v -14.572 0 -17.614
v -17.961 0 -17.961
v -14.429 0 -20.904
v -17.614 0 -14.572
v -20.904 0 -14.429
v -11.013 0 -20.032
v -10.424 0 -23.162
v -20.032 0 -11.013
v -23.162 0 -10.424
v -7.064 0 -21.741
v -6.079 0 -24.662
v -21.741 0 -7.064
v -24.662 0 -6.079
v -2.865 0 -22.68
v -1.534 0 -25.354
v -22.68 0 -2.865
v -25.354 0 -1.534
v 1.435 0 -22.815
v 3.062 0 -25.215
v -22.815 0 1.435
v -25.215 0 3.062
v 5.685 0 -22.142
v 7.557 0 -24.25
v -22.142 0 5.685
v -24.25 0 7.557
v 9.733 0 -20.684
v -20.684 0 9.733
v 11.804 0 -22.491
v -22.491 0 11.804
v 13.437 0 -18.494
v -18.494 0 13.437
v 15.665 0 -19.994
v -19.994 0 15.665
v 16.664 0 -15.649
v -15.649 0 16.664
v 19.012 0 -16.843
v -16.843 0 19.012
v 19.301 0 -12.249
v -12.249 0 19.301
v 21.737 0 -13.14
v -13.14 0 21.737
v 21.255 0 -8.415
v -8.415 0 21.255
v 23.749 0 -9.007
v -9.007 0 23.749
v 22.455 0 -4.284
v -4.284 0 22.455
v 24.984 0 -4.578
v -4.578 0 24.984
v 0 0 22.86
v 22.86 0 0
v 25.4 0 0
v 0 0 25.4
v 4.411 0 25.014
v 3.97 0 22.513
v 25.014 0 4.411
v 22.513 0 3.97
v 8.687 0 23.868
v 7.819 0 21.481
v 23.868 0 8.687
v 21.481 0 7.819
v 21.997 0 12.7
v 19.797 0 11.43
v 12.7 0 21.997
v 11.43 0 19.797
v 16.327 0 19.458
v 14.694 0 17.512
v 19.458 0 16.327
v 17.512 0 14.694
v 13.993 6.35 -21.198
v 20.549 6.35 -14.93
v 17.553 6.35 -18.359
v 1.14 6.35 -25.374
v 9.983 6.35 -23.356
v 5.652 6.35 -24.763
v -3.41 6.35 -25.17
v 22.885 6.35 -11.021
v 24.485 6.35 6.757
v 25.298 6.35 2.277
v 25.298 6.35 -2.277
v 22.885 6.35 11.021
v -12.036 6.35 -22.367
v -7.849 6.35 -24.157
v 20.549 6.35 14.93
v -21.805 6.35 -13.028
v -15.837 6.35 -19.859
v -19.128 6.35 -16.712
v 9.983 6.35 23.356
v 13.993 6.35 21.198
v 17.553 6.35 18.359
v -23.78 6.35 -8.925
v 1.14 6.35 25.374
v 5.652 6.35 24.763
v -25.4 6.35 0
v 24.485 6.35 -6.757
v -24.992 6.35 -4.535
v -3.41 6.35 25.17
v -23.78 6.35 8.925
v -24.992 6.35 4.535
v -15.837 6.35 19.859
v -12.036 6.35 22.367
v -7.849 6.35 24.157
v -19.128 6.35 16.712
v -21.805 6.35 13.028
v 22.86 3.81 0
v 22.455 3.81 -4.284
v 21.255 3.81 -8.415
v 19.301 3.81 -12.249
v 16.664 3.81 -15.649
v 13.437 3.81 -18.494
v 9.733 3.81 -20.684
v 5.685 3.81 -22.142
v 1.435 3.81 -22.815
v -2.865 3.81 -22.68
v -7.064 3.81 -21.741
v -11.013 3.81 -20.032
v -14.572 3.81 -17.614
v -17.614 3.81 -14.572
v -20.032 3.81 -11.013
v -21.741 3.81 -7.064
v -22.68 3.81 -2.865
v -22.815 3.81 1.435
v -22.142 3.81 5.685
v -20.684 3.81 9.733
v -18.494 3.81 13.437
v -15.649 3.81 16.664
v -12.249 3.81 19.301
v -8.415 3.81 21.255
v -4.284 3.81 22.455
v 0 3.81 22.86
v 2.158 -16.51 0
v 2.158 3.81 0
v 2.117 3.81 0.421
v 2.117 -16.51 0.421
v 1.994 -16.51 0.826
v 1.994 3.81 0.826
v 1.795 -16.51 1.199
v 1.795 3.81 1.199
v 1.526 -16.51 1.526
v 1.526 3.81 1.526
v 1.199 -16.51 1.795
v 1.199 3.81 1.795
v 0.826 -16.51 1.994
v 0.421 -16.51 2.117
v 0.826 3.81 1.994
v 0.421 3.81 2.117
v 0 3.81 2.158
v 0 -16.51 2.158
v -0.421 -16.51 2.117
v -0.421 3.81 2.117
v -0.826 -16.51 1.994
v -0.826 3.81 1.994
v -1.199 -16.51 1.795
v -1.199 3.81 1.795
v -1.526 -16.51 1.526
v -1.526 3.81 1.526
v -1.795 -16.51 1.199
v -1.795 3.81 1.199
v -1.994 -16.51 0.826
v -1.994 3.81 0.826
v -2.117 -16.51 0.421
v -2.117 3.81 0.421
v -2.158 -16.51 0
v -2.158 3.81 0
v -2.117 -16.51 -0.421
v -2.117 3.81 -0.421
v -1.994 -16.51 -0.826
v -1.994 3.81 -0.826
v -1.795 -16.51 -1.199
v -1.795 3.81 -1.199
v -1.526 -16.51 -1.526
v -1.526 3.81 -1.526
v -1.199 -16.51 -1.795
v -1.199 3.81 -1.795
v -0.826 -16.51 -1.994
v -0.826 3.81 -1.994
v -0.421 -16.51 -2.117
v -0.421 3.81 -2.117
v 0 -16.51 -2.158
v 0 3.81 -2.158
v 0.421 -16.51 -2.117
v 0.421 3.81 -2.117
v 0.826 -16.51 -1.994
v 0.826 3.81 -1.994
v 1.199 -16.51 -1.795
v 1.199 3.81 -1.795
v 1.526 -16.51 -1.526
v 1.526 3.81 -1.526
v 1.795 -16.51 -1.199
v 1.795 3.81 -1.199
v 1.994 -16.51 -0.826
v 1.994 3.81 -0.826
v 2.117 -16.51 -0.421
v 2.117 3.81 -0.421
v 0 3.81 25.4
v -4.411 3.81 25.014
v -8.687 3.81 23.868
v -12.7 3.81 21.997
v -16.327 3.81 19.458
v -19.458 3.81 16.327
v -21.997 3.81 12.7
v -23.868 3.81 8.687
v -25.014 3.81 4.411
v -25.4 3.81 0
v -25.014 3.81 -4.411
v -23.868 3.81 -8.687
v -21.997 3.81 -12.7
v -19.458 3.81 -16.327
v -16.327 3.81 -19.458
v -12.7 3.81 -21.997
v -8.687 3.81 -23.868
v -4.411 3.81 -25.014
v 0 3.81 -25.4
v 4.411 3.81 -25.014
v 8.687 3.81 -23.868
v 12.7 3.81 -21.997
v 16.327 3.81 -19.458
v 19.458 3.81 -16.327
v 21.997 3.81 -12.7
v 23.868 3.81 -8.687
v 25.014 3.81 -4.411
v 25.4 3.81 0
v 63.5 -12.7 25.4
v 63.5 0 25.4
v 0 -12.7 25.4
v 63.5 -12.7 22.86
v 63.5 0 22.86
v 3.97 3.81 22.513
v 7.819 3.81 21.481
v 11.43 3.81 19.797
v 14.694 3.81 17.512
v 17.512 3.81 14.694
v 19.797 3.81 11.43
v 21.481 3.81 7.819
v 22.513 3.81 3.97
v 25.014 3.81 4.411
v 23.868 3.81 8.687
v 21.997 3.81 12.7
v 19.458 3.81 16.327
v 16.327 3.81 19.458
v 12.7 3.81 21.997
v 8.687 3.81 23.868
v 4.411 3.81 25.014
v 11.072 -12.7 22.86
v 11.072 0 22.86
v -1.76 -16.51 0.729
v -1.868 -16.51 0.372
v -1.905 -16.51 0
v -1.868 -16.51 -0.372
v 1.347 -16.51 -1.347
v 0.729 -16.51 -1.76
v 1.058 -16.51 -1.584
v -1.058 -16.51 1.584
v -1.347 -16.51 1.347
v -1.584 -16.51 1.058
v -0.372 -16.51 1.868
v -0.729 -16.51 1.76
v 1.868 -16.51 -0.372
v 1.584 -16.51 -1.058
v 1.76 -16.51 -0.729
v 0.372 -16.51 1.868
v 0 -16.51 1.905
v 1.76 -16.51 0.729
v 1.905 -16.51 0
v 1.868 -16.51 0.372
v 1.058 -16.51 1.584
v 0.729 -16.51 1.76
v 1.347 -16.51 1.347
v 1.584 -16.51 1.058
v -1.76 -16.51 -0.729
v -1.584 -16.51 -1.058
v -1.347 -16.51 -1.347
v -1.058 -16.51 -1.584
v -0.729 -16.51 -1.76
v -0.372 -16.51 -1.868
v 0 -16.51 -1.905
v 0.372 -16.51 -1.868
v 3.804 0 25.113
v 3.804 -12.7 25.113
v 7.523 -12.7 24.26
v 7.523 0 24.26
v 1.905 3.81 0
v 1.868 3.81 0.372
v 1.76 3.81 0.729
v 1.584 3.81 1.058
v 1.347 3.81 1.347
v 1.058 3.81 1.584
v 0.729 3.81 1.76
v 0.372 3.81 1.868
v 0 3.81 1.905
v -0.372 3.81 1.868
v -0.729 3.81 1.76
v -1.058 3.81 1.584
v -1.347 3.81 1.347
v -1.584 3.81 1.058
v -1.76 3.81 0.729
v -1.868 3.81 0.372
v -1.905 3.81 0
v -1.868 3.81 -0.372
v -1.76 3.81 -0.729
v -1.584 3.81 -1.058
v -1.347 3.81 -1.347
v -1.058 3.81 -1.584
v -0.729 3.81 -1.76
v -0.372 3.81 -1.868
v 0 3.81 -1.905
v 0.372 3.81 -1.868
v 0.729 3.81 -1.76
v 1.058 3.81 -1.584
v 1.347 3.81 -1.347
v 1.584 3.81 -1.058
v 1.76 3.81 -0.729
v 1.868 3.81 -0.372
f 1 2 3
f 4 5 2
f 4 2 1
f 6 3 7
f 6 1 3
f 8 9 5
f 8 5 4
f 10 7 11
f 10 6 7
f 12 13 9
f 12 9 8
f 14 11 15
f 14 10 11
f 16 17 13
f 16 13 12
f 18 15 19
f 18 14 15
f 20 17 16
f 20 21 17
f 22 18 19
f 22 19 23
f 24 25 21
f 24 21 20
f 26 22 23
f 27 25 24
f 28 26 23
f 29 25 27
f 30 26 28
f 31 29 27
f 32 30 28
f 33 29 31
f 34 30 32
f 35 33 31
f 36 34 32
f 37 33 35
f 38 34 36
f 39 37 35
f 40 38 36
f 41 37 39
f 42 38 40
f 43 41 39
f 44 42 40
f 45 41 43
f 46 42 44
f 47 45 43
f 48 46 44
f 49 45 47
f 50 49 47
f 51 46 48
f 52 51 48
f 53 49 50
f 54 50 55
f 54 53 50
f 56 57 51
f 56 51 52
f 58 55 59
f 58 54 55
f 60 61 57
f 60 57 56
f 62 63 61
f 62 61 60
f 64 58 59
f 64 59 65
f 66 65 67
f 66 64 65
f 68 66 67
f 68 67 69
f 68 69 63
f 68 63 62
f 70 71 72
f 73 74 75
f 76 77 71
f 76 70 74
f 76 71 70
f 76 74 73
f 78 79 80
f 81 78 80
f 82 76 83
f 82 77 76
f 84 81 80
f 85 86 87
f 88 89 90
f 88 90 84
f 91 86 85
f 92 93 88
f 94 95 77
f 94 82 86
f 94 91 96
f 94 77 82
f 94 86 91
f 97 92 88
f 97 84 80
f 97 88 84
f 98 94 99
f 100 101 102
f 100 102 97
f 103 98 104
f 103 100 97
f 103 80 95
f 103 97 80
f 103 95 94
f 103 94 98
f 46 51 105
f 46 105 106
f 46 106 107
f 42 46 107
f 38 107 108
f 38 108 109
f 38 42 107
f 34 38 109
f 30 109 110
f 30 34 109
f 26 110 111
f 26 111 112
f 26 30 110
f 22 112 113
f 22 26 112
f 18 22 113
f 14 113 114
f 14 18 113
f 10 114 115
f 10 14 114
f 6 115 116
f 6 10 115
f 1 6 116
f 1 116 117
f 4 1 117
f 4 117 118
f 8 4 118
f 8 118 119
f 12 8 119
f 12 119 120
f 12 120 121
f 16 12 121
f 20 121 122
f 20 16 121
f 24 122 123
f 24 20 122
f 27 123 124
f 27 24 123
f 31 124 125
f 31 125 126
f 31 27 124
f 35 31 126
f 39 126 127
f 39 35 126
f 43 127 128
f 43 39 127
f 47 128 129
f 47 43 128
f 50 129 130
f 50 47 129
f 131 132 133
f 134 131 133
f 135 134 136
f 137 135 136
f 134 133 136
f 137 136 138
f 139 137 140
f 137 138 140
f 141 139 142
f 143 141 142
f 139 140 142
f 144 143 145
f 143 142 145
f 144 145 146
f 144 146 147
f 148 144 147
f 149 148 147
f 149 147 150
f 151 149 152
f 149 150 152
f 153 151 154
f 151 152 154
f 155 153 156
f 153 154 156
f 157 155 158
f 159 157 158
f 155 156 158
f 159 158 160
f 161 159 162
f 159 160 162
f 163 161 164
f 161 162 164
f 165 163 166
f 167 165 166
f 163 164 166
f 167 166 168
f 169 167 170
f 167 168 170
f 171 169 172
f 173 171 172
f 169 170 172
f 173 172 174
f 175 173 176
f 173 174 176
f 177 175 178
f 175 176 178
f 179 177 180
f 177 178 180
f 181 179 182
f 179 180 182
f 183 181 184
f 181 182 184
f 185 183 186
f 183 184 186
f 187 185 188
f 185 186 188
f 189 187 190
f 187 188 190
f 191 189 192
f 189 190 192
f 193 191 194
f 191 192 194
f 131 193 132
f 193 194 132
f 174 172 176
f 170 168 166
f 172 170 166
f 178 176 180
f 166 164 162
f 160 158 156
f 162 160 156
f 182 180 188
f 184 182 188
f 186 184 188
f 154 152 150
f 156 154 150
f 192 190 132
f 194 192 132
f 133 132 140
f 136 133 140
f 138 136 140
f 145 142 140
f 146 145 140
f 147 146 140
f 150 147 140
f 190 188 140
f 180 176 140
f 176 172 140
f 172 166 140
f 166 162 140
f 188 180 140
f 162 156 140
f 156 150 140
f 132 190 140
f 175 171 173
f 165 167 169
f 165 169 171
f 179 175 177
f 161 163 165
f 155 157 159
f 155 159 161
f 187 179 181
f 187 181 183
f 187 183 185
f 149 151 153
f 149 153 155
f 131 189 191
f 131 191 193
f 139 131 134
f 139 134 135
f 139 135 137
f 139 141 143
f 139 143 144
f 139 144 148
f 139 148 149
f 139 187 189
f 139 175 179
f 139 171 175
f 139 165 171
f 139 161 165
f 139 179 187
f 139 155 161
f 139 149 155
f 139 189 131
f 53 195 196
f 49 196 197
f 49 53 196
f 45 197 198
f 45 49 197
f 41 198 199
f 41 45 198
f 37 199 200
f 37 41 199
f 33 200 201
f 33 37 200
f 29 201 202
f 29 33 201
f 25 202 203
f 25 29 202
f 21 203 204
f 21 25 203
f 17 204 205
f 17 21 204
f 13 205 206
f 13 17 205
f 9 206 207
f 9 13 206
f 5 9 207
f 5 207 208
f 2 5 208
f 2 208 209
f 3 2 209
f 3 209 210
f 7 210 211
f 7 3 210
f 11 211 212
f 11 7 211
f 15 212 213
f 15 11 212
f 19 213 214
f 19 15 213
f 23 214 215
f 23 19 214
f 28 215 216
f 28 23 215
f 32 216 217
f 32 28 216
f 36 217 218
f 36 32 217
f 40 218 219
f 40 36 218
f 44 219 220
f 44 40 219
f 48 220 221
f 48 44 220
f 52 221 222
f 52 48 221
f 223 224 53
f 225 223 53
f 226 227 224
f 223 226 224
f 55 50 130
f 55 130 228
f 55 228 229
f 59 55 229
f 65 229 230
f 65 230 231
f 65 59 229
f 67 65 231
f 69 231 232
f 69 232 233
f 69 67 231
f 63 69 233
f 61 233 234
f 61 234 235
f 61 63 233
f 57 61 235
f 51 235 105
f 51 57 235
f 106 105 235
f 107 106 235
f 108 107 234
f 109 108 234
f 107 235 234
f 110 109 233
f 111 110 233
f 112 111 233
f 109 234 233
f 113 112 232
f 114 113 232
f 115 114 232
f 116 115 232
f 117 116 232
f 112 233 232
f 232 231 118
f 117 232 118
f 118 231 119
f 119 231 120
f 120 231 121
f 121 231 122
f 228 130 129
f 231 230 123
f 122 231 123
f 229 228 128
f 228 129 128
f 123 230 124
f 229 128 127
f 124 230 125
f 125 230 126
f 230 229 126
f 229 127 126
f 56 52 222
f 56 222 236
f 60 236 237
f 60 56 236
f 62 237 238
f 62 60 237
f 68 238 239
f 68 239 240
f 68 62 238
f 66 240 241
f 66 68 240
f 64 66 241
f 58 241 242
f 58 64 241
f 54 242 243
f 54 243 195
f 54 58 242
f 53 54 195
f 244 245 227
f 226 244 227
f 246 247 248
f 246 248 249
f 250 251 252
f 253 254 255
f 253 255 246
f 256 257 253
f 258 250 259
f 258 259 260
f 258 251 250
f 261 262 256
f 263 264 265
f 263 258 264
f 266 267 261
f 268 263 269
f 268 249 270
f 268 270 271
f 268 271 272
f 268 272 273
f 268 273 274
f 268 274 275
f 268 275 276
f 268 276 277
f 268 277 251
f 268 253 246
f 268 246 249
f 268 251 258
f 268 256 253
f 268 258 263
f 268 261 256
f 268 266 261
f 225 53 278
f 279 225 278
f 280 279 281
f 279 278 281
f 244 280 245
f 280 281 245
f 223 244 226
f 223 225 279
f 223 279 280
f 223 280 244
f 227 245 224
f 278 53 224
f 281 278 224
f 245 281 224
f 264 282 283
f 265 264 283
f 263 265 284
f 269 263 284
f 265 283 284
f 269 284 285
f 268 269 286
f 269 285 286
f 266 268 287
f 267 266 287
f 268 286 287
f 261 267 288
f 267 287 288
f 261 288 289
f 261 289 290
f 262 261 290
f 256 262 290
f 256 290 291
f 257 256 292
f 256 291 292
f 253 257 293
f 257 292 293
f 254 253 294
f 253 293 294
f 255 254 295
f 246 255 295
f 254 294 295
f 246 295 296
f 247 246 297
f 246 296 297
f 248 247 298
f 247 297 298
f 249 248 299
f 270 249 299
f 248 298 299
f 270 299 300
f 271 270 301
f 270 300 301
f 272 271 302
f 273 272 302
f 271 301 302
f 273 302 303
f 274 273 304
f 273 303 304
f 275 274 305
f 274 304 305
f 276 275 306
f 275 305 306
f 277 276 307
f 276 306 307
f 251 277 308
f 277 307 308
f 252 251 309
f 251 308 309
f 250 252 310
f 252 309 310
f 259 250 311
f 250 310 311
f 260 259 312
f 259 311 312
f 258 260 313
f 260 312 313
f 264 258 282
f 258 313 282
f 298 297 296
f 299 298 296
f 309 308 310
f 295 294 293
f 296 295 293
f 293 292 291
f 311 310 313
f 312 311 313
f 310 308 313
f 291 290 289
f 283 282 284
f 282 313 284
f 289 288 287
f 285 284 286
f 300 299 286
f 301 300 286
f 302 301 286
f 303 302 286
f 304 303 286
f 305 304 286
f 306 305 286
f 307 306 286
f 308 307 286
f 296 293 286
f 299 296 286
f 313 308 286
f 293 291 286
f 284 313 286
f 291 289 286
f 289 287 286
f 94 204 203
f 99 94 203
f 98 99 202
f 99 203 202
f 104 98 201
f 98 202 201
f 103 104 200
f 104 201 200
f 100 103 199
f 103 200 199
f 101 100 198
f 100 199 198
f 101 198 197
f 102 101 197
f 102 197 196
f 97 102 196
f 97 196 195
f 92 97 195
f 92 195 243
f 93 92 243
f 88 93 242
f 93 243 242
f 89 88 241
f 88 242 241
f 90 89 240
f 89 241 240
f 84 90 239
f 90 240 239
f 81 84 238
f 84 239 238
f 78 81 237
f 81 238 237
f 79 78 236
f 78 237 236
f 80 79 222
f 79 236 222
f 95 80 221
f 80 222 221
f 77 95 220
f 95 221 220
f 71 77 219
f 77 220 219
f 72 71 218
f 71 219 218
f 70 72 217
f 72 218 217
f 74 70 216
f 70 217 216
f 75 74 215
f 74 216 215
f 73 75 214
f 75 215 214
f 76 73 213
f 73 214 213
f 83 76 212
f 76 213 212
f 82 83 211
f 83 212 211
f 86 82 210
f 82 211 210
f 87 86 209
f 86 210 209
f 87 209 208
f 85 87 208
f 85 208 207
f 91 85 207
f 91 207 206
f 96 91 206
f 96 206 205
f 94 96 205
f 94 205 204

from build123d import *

# Parameters (mm, degrees)
F1_DEPTH = 3.81
F2_R     = 25.4
F3_DEPTH = 2.54
F5_DEPTH = 12.7
F6_R     = 1.905
F7_DEPTH = 20.32
F8_R     = 2.158411
F9_DEPTH = 20.32


with BuildPart() as f1:
    # F0 (on Front) → F1 (new body)
    with BuildSketch(Plane.XZ):
        with BuildLine():
            ThreePointArc((0, 25.4), (-17.960512, -17.960512), (25.4, 0))
            ThreePointArc((25.4, 0), (17.960512, 17.960512), (0, 25.4))
        make_face()
        with BuildLine():
            ThreePointArc((22.86, 0), (-16.164461, -16.164461), (0, 22.86))
            ThreePointArc((0, 22.86), (16.164461, 16.164461), (22.86, 0))
        make_face(mode=Mode.SUBTRACT)
    extrude(amount=-F1_DEPTH)

    # F2 (on face) → F3 (join)
    with BuildSketch(Plane(origin=(0, 3.81, 0), x_dir=(-1, 0, 0), z_dir=(0, 1, 0))):
        Circle(F2_R)
    extrude(amount=F3_DEPTH)


with BuildPart() as f5:
    # F4 (on face) → F5 (new body)
    with BuildSketch(Plane.XZ):
        with BuildLine():
            Line((63.5, 25.4), (0, 25.4))
            ThreePointArc((0, 25.4), (5.679613, 24.756858), (11.071603, 22.86))
            Line((11.071603, 22.86), (63.5, 22.86))
            Line((63.5, 22.86), (63.5, 25.4))
        make_face()
    extrude(amount=F5_DEPTH)


with BuildPart() as f7:
    # F6 (on face) → F7 (new body)
    with BuildSketch(Plane.XZ.offset(-3.81)):
        Circle(F6_R)
    extrude(amount=F7_DEPTH)


with BuildPart() as f9:
    # F8 (on face) → F9 (new body)
    with BuildSketch(Plane.XZ.offset(-3.81)):
        Circle(F8_R)
    extrude(amount=F9_DEPTH)


solid = Compound([f1.part, f5.part, f7.part, f9.part])
